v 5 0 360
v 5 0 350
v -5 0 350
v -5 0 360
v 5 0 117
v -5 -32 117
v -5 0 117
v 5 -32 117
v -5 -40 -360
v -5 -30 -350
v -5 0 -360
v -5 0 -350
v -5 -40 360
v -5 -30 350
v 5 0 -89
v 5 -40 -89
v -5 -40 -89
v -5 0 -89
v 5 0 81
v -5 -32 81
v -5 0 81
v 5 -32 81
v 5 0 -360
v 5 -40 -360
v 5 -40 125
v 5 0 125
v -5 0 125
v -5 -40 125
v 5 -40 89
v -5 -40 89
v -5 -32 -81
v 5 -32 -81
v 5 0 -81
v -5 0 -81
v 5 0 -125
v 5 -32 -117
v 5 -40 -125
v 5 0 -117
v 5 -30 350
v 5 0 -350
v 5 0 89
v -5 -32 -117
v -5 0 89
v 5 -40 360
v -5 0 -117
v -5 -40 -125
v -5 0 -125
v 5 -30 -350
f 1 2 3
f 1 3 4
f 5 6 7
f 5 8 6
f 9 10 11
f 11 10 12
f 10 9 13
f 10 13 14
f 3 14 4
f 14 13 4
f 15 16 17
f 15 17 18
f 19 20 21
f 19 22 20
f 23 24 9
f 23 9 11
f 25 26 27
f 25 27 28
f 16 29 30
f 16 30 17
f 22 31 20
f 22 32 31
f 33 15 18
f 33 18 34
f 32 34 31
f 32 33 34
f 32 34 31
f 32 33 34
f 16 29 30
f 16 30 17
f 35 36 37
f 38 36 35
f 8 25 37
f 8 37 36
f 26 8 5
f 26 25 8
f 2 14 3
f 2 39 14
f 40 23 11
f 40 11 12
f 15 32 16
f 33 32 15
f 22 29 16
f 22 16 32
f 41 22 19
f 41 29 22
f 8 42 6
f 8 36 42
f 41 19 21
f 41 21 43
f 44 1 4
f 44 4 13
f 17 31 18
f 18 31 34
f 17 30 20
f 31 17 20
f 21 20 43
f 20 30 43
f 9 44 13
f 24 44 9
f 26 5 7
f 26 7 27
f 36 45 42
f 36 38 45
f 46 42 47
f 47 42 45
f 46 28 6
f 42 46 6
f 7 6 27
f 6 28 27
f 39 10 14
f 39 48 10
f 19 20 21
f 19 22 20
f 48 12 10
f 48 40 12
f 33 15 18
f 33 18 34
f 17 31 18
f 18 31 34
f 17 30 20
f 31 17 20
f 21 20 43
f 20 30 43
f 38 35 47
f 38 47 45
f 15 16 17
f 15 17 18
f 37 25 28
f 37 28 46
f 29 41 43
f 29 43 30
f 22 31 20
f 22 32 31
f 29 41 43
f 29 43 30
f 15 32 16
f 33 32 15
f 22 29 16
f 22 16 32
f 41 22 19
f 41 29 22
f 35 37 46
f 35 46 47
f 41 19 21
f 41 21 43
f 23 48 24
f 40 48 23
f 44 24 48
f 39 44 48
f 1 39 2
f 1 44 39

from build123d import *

# Parameters (mm, degrees)
F1_DEPTH = 5
F3_DEPTH = 5
F5_DEPTH = 5
F7_DEPTH = 5


with BuildPart() as f1:
    # F0 (on Right) → F1 (new body, symmetric)
    with BuildSketch(Plane.YZ):
        Polygon((-32, 117), (0, 117), (0, 125), (-40, 125), (-40, -125), (0, -125), (0, -117), (-32, -117), align=None)
    extrude(amount=F1_DEPTH, both=True)


with BuildPart() as f3:
    # F2 (on Right) → F3 (new body, symmetric)
    with BuildSketch(Plane.YZ):
        Polygon((-30, 350), (0, 350), (0, 360), (-40, 360), (-40, -360), (0, -360), (0, -350), (-30, -350), align=None)
    extrude(amount=F3_DEPTH, both=True)


with BuildPart() as f5:
    # F4 (on Right) → F5 (new body, symmetric)
    with BuildSketch(Plane.YZ):
        Polygon((-32, 81), (0, 81), (0, 89), (-40, 89), (-40, -89), (0, -89), (0, -81), (-32, -81), align=None)
    extrude(amount=F5_DEPTH, both=True)


with BuildPart() as f7:
    # F6 (on Right) → F7 (new body, symmetric)
    with BuildSketch(Plane.YZ):
        Polygon((-32, 81), (0, 81), (0, 89), (-40, 89), (-40, -89), (0, -89), (0, -81), (-32, -81), align=None)
    extrude(amount=F7_DEPTH, both=True)


solid = Compound([f1.part, f3.part, f5.part, f7.part])
